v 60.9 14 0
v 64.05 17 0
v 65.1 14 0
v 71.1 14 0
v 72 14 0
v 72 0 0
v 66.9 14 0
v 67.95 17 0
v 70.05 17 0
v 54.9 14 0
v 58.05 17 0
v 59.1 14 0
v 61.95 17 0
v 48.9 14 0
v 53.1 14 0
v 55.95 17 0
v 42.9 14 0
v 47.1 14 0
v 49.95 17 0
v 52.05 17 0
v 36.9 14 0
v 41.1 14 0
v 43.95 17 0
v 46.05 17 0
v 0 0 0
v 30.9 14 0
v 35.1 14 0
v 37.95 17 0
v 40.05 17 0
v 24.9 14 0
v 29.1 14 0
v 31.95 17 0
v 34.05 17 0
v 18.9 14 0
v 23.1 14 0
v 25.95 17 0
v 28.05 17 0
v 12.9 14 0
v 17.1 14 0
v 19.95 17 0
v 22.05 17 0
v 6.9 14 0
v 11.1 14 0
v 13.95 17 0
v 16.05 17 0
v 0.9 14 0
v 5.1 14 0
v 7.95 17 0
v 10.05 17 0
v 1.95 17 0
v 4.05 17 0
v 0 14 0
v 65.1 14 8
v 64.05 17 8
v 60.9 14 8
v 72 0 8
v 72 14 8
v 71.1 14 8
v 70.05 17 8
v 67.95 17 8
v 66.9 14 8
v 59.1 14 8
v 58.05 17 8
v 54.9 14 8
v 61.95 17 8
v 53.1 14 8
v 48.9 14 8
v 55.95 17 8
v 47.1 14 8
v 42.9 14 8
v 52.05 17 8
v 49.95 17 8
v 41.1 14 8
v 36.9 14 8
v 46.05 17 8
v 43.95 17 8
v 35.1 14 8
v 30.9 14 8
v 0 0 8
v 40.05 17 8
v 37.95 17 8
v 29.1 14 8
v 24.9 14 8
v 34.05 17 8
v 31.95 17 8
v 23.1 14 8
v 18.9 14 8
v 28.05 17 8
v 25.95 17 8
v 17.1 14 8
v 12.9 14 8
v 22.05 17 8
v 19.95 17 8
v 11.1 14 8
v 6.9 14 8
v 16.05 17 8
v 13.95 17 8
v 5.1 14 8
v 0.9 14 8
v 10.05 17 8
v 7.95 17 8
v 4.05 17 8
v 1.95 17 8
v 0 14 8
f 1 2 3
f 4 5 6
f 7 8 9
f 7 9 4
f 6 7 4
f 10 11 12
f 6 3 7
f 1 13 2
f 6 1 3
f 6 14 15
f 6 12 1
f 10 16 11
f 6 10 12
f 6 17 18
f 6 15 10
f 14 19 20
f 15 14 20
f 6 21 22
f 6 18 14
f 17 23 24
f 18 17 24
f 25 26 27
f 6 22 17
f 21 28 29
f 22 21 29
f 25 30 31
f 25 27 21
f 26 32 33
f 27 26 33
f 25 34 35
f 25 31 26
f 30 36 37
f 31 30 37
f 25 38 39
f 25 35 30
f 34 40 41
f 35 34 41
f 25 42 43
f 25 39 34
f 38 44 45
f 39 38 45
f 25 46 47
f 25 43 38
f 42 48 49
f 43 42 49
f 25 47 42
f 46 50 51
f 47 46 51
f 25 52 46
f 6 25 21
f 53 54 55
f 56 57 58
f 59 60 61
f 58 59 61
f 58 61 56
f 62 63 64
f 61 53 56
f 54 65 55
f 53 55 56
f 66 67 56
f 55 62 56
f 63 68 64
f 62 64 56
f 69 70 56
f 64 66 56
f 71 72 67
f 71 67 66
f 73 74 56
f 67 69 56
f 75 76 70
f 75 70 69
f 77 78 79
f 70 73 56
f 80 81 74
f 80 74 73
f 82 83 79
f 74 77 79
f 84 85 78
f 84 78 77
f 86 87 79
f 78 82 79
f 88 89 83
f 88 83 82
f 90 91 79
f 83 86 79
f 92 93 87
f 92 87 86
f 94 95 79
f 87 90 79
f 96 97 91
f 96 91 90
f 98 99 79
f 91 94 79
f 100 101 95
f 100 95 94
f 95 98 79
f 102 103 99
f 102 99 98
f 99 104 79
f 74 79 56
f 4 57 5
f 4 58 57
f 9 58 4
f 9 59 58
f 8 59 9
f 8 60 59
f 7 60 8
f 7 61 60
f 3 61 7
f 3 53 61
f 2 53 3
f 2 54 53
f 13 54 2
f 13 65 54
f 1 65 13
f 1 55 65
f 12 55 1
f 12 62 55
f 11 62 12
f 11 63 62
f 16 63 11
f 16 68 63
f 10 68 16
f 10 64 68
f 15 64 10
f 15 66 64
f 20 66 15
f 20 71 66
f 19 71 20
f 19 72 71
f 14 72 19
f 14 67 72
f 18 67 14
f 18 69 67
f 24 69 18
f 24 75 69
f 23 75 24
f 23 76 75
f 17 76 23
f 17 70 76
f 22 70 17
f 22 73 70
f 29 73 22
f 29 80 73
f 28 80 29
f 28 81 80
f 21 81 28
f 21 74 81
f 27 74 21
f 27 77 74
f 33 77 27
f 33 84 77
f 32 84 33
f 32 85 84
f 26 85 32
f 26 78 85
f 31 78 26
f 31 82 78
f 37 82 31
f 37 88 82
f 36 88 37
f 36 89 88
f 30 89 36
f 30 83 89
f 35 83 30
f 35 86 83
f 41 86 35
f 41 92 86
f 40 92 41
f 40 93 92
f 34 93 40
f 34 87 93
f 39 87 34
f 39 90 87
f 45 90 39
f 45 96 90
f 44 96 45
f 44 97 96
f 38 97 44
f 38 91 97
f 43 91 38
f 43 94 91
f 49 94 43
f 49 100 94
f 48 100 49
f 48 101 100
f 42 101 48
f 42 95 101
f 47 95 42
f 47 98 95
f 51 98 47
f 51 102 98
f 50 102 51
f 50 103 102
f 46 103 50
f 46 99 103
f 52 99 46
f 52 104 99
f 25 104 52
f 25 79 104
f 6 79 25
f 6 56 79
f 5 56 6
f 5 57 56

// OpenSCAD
$fn = 32;

// ----------------------------------------------------------------------
// Gear rack: 12 teeth, pitch 6 mm
// ----------------------------------------------------------------------

// --- parameters (mm) ---
teeth = 12;               // number of teeth
pitch = 6;                // tooth pitch, X
root_w = 4.2;             // tooth width at the root
tip_w = 2.1;              // tooth width at the tip
base_h = 14;              // rack body height, Y
tooth_h = 3;              // tooth height above the body
plate_t = 8;              // rack width, Z (extrusion height)

rack_l = teeth * pitch;  // overall length
total_h = base_h + tooth_h;  // overall height

profile = [[0, 0], [72, 0], [72, 14], [71.1, 14], [70.05, 17], [67.95, 17], [66.9, 14], [65.1, 14], [64.05, 17], [61.95, 17], [60.9, 14], [59.1, 14], [58.05, 17], [55.95, 17], [54.9, 14], [53.1, 14], [52.05, 17], [49.95, 17], [48.9, 14], [47.1, 14], [46.05, 17], [43.95, 17], [42.9, 14], [41.1, 14], [40.05, 17], [37.95, 17], [36.9, 14], [35.1, 14], [34.05, 17], [31.95, 17], [30.9, 14], [29.1, 14], [28.05, 17], [25.95, 17], [24.9, 14], [23.1, 14], [22.05, 17], [19.95, 17], [18.9, 14], [17.1, 14], [16.05, 17], [13.95, 17], [12.9, 14], [11.1, 14], [10.05, 17], [7.95, 17], [6.9, 14], [5.1, 14], [4.05, 17], [1.95, 17], [0.9, 14], [0, 14]];  // primary outline, 52 points, counter clockwise

// --- the one profile operation ---
linear_extrude(height = plate_t) polygon(points = profile);
